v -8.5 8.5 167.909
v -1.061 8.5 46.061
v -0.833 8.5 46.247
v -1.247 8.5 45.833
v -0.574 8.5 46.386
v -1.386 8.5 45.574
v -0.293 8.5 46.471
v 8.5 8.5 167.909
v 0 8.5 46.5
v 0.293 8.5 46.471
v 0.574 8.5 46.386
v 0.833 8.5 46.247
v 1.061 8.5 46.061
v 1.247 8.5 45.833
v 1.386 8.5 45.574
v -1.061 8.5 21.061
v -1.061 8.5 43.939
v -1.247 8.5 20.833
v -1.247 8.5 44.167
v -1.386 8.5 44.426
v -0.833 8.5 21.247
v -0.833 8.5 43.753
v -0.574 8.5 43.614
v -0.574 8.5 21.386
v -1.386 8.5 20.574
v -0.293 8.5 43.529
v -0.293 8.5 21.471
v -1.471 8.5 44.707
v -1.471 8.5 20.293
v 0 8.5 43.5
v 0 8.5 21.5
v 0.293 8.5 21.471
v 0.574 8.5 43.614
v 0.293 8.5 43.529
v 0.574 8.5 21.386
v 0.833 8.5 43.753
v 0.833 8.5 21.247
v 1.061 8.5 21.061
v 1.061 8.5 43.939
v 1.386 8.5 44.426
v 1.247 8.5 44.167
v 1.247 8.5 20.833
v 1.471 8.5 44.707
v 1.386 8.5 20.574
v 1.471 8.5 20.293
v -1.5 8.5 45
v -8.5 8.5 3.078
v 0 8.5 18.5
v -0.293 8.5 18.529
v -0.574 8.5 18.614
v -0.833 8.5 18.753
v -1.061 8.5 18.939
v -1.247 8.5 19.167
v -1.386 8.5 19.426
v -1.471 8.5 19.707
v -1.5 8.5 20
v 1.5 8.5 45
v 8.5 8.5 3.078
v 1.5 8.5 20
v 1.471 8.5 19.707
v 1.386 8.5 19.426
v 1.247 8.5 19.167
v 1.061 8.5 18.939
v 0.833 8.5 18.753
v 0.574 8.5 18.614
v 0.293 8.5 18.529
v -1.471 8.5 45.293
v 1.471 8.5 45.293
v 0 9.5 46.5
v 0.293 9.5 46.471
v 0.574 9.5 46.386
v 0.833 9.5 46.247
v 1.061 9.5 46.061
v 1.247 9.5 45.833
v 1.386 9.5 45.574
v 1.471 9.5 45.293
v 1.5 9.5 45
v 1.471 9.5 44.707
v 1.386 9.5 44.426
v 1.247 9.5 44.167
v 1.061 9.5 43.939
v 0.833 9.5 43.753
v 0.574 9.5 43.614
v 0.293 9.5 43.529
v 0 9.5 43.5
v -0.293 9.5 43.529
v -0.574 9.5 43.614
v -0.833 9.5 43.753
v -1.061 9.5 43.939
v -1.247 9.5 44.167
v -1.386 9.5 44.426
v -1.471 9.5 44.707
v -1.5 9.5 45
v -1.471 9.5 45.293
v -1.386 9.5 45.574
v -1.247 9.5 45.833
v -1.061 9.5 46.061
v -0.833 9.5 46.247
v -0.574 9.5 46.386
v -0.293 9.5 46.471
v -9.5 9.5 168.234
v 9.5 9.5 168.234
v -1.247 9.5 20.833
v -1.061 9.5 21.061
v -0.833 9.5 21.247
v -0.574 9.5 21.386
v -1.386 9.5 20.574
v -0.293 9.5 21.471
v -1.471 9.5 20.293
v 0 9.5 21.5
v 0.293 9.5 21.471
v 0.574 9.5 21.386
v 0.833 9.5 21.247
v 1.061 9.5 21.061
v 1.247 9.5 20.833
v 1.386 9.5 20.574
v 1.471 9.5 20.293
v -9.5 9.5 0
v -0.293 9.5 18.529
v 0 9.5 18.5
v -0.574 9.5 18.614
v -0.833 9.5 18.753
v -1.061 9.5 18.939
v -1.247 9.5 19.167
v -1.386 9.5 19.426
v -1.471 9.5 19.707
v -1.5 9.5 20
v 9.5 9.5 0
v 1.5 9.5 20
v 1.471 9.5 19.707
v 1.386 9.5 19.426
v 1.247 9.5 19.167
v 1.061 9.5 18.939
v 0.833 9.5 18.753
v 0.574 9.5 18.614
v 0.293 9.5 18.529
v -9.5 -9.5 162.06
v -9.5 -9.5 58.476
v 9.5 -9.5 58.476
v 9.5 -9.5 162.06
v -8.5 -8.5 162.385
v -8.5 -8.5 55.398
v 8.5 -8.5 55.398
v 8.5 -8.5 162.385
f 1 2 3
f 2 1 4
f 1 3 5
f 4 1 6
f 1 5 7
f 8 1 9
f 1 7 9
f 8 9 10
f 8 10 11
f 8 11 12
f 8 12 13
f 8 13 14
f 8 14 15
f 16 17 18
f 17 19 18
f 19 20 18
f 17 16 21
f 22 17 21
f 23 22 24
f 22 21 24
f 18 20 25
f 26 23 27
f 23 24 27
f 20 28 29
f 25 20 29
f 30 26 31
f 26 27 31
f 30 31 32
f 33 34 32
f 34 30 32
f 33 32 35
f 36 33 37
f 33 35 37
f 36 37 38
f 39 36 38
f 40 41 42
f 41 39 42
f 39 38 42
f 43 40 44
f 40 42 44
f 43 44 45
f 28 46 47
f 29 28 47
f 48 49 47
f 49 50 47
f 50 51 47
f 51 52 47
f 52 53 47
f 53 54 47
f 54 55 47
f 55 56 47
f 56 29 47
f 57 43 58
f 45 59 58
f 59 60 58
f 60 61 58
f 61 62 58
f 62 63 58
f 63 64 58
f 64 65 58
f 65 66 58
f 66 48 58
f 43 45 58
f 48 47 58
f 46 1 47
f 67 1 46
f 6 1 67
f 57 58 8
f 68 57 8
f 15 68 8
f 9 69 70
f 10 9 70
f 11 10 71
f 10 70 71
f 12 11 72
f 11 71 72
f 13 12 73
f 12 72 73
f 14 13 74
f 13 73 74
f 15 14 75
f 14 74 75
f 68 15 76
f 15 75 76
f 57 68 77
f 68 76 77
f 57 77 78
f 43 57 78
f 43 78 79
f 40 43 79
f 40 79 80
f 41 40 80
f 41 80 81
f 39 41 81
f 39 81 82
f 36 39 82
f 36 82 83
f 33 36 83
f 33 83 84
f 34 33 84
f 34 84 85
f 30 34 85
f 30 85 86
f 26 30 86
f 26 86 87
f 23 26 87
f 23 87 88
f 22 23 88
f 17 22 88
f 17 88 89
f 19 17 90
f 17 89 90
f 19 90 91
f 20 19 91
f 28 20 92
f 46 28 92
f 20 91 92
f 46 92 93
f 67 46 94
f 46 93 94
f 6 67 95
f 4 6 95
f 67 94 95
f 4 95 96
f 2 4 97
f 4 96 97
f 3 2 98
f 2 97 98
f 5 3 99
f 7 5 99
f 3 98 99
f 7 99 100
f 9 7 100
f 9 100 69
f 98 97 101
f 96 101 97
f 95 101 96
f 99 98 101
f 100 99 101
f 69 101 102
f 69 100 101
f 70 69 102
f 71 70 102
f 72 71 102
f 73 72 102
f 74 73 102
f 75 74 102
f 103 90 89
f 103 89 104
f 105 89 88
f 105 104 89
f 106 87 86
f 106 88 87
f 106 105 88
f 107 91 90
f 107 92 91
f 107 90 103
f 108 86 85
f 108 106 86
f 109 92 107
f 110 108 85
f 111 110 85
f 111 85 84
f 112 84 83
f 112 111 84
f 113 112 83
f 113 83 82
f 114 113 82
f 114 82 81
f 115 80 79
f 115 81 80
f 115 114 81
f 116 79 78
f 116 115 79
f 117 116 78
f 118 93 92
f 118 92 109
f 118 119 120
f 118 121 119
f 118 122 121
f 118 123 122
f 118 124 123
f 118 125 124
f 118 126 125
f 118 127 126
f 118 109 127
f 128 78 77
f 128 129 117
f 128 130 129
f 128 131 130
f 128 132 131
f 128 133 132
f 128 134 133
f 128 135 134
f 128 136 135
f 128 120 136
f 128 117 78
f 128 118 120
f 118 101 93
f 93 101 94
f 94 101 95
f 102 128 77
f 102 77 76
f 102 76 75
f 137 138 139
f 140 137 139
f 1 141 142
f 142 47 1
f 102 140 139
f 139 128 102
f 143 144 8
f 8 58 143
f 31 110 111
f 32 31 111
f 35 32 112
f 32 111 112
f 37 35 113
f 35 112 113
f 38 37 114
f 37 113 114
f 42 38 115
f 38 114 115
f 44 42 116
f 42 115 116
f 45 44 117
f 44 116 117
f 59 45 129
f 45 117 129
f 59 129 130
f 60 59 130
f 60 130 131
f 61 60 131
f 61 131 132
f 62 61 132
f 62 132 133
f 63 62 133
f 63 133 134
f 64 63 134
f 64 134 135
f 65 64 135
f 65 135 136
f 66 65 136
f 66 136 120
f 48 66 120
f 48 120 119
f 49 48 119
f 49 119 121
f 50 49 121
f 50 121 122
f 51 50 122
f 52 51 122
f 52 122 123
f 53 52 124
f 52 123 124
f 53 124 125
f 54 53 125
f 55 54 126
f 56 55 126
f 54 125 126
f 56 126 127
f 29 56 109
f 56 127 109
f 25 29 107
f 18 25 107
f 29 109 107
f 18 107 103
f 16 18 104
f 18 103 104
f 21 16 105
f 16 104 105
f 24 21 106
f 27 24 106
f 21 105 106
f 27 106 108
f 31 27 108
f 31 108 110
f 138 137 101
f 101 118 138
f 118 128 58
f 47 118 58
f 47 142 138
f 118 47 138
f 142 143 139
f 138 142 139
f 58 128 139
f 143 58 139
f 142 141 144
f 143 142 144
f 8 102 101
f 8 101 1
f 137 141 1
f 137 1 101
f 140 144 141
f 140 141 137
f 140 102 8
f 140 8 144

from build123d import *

# Parameters (mm, degrees)
ESBO_O1_W                = 19
ESBO_O1_H                = 19
RESSALTO_EXTRUS_O1_DEPTH = 260
CASCA2_T                 = -1
CORTE_EXTRUS_O1_DEPTH    = 261.866345089
CORTE_EXTRUS_O3_DEPTH    = 261.866345089
ESBO_O5_R                = 1.5
CORTE_EXTRUS_O4_DEPTH    = 170.569790677


with BuildPart() as part:
    # Esboço1 → Ressalto-extrusão1 (new body)
    with BuildSketch(Plane.XY):
        Rectangle(ESBO_O1_W, ESBO_O1_H)
    extrude(amount=RESSALTO_EXTRUS_O1_DEPTH)

    # Casca2
    casca2_openings = [part.faces().sort_by_distance(p)[0] for p in [
        (0, 0, 260),
        (0, 0, 0),
    ]]
    offset(amount=CASCA2_T, openings=casca2_openings, kind=Kind.INTERSECTION)

    # Esboço2 → Corte-extrusão1 (cut, through all)
    with BuildSketch(Plane(origin=(9.5, 0, 0), x_dir=(0, 0, -1), z_dir=(1, 0, 0))):
        Polygon((0, 9.5), (-58.475987206, -9.5), (0, -9.5), align=None)
    extrude(amount=-CORTE_EXTRUS_O1_DEPTH, mode=Mode.SUBTRACT)

    # Esboço4 → Corte-extrusão3 (cut, through all)
    with BuildSketch(Plane(origin=(9.5, 0, 0), x_dir=(0, 0, -1), z_dir=(1, 0, 0))):
        Polygon((-168.550335734, 10.473717073), (-161.289503816, -11.872825786), (-264.812755879, -45.509569399), (-289.05777752, 22.149749677), (-184.516070462, 59.611196004), align=None)
    extrude(amount=-CORTE_EXTRUS_O3_DEPTH, mode=Mode.SUBTRACT)

    # Esboço5 → Corte-extrusão4 (cut, through all)
    with BuildSketch(Plane(origin=(0, 9.5, 0), x_dir=(1, 0, 0), z_dir=(0, 1, 0))):
        with Locations(Location((0, -20, 0), (0, 0, 270))):
            Circle(ESBO_O5_R)
        with Locations(Location((0, -45, 0), (0, 0, 270))):
            Circle(ESBO_O5_R)
    extrude(amount=-CORTE_EXTRUS_O4_DEPTH, mode=Mode.SUBTRACT)


solid = part.part
